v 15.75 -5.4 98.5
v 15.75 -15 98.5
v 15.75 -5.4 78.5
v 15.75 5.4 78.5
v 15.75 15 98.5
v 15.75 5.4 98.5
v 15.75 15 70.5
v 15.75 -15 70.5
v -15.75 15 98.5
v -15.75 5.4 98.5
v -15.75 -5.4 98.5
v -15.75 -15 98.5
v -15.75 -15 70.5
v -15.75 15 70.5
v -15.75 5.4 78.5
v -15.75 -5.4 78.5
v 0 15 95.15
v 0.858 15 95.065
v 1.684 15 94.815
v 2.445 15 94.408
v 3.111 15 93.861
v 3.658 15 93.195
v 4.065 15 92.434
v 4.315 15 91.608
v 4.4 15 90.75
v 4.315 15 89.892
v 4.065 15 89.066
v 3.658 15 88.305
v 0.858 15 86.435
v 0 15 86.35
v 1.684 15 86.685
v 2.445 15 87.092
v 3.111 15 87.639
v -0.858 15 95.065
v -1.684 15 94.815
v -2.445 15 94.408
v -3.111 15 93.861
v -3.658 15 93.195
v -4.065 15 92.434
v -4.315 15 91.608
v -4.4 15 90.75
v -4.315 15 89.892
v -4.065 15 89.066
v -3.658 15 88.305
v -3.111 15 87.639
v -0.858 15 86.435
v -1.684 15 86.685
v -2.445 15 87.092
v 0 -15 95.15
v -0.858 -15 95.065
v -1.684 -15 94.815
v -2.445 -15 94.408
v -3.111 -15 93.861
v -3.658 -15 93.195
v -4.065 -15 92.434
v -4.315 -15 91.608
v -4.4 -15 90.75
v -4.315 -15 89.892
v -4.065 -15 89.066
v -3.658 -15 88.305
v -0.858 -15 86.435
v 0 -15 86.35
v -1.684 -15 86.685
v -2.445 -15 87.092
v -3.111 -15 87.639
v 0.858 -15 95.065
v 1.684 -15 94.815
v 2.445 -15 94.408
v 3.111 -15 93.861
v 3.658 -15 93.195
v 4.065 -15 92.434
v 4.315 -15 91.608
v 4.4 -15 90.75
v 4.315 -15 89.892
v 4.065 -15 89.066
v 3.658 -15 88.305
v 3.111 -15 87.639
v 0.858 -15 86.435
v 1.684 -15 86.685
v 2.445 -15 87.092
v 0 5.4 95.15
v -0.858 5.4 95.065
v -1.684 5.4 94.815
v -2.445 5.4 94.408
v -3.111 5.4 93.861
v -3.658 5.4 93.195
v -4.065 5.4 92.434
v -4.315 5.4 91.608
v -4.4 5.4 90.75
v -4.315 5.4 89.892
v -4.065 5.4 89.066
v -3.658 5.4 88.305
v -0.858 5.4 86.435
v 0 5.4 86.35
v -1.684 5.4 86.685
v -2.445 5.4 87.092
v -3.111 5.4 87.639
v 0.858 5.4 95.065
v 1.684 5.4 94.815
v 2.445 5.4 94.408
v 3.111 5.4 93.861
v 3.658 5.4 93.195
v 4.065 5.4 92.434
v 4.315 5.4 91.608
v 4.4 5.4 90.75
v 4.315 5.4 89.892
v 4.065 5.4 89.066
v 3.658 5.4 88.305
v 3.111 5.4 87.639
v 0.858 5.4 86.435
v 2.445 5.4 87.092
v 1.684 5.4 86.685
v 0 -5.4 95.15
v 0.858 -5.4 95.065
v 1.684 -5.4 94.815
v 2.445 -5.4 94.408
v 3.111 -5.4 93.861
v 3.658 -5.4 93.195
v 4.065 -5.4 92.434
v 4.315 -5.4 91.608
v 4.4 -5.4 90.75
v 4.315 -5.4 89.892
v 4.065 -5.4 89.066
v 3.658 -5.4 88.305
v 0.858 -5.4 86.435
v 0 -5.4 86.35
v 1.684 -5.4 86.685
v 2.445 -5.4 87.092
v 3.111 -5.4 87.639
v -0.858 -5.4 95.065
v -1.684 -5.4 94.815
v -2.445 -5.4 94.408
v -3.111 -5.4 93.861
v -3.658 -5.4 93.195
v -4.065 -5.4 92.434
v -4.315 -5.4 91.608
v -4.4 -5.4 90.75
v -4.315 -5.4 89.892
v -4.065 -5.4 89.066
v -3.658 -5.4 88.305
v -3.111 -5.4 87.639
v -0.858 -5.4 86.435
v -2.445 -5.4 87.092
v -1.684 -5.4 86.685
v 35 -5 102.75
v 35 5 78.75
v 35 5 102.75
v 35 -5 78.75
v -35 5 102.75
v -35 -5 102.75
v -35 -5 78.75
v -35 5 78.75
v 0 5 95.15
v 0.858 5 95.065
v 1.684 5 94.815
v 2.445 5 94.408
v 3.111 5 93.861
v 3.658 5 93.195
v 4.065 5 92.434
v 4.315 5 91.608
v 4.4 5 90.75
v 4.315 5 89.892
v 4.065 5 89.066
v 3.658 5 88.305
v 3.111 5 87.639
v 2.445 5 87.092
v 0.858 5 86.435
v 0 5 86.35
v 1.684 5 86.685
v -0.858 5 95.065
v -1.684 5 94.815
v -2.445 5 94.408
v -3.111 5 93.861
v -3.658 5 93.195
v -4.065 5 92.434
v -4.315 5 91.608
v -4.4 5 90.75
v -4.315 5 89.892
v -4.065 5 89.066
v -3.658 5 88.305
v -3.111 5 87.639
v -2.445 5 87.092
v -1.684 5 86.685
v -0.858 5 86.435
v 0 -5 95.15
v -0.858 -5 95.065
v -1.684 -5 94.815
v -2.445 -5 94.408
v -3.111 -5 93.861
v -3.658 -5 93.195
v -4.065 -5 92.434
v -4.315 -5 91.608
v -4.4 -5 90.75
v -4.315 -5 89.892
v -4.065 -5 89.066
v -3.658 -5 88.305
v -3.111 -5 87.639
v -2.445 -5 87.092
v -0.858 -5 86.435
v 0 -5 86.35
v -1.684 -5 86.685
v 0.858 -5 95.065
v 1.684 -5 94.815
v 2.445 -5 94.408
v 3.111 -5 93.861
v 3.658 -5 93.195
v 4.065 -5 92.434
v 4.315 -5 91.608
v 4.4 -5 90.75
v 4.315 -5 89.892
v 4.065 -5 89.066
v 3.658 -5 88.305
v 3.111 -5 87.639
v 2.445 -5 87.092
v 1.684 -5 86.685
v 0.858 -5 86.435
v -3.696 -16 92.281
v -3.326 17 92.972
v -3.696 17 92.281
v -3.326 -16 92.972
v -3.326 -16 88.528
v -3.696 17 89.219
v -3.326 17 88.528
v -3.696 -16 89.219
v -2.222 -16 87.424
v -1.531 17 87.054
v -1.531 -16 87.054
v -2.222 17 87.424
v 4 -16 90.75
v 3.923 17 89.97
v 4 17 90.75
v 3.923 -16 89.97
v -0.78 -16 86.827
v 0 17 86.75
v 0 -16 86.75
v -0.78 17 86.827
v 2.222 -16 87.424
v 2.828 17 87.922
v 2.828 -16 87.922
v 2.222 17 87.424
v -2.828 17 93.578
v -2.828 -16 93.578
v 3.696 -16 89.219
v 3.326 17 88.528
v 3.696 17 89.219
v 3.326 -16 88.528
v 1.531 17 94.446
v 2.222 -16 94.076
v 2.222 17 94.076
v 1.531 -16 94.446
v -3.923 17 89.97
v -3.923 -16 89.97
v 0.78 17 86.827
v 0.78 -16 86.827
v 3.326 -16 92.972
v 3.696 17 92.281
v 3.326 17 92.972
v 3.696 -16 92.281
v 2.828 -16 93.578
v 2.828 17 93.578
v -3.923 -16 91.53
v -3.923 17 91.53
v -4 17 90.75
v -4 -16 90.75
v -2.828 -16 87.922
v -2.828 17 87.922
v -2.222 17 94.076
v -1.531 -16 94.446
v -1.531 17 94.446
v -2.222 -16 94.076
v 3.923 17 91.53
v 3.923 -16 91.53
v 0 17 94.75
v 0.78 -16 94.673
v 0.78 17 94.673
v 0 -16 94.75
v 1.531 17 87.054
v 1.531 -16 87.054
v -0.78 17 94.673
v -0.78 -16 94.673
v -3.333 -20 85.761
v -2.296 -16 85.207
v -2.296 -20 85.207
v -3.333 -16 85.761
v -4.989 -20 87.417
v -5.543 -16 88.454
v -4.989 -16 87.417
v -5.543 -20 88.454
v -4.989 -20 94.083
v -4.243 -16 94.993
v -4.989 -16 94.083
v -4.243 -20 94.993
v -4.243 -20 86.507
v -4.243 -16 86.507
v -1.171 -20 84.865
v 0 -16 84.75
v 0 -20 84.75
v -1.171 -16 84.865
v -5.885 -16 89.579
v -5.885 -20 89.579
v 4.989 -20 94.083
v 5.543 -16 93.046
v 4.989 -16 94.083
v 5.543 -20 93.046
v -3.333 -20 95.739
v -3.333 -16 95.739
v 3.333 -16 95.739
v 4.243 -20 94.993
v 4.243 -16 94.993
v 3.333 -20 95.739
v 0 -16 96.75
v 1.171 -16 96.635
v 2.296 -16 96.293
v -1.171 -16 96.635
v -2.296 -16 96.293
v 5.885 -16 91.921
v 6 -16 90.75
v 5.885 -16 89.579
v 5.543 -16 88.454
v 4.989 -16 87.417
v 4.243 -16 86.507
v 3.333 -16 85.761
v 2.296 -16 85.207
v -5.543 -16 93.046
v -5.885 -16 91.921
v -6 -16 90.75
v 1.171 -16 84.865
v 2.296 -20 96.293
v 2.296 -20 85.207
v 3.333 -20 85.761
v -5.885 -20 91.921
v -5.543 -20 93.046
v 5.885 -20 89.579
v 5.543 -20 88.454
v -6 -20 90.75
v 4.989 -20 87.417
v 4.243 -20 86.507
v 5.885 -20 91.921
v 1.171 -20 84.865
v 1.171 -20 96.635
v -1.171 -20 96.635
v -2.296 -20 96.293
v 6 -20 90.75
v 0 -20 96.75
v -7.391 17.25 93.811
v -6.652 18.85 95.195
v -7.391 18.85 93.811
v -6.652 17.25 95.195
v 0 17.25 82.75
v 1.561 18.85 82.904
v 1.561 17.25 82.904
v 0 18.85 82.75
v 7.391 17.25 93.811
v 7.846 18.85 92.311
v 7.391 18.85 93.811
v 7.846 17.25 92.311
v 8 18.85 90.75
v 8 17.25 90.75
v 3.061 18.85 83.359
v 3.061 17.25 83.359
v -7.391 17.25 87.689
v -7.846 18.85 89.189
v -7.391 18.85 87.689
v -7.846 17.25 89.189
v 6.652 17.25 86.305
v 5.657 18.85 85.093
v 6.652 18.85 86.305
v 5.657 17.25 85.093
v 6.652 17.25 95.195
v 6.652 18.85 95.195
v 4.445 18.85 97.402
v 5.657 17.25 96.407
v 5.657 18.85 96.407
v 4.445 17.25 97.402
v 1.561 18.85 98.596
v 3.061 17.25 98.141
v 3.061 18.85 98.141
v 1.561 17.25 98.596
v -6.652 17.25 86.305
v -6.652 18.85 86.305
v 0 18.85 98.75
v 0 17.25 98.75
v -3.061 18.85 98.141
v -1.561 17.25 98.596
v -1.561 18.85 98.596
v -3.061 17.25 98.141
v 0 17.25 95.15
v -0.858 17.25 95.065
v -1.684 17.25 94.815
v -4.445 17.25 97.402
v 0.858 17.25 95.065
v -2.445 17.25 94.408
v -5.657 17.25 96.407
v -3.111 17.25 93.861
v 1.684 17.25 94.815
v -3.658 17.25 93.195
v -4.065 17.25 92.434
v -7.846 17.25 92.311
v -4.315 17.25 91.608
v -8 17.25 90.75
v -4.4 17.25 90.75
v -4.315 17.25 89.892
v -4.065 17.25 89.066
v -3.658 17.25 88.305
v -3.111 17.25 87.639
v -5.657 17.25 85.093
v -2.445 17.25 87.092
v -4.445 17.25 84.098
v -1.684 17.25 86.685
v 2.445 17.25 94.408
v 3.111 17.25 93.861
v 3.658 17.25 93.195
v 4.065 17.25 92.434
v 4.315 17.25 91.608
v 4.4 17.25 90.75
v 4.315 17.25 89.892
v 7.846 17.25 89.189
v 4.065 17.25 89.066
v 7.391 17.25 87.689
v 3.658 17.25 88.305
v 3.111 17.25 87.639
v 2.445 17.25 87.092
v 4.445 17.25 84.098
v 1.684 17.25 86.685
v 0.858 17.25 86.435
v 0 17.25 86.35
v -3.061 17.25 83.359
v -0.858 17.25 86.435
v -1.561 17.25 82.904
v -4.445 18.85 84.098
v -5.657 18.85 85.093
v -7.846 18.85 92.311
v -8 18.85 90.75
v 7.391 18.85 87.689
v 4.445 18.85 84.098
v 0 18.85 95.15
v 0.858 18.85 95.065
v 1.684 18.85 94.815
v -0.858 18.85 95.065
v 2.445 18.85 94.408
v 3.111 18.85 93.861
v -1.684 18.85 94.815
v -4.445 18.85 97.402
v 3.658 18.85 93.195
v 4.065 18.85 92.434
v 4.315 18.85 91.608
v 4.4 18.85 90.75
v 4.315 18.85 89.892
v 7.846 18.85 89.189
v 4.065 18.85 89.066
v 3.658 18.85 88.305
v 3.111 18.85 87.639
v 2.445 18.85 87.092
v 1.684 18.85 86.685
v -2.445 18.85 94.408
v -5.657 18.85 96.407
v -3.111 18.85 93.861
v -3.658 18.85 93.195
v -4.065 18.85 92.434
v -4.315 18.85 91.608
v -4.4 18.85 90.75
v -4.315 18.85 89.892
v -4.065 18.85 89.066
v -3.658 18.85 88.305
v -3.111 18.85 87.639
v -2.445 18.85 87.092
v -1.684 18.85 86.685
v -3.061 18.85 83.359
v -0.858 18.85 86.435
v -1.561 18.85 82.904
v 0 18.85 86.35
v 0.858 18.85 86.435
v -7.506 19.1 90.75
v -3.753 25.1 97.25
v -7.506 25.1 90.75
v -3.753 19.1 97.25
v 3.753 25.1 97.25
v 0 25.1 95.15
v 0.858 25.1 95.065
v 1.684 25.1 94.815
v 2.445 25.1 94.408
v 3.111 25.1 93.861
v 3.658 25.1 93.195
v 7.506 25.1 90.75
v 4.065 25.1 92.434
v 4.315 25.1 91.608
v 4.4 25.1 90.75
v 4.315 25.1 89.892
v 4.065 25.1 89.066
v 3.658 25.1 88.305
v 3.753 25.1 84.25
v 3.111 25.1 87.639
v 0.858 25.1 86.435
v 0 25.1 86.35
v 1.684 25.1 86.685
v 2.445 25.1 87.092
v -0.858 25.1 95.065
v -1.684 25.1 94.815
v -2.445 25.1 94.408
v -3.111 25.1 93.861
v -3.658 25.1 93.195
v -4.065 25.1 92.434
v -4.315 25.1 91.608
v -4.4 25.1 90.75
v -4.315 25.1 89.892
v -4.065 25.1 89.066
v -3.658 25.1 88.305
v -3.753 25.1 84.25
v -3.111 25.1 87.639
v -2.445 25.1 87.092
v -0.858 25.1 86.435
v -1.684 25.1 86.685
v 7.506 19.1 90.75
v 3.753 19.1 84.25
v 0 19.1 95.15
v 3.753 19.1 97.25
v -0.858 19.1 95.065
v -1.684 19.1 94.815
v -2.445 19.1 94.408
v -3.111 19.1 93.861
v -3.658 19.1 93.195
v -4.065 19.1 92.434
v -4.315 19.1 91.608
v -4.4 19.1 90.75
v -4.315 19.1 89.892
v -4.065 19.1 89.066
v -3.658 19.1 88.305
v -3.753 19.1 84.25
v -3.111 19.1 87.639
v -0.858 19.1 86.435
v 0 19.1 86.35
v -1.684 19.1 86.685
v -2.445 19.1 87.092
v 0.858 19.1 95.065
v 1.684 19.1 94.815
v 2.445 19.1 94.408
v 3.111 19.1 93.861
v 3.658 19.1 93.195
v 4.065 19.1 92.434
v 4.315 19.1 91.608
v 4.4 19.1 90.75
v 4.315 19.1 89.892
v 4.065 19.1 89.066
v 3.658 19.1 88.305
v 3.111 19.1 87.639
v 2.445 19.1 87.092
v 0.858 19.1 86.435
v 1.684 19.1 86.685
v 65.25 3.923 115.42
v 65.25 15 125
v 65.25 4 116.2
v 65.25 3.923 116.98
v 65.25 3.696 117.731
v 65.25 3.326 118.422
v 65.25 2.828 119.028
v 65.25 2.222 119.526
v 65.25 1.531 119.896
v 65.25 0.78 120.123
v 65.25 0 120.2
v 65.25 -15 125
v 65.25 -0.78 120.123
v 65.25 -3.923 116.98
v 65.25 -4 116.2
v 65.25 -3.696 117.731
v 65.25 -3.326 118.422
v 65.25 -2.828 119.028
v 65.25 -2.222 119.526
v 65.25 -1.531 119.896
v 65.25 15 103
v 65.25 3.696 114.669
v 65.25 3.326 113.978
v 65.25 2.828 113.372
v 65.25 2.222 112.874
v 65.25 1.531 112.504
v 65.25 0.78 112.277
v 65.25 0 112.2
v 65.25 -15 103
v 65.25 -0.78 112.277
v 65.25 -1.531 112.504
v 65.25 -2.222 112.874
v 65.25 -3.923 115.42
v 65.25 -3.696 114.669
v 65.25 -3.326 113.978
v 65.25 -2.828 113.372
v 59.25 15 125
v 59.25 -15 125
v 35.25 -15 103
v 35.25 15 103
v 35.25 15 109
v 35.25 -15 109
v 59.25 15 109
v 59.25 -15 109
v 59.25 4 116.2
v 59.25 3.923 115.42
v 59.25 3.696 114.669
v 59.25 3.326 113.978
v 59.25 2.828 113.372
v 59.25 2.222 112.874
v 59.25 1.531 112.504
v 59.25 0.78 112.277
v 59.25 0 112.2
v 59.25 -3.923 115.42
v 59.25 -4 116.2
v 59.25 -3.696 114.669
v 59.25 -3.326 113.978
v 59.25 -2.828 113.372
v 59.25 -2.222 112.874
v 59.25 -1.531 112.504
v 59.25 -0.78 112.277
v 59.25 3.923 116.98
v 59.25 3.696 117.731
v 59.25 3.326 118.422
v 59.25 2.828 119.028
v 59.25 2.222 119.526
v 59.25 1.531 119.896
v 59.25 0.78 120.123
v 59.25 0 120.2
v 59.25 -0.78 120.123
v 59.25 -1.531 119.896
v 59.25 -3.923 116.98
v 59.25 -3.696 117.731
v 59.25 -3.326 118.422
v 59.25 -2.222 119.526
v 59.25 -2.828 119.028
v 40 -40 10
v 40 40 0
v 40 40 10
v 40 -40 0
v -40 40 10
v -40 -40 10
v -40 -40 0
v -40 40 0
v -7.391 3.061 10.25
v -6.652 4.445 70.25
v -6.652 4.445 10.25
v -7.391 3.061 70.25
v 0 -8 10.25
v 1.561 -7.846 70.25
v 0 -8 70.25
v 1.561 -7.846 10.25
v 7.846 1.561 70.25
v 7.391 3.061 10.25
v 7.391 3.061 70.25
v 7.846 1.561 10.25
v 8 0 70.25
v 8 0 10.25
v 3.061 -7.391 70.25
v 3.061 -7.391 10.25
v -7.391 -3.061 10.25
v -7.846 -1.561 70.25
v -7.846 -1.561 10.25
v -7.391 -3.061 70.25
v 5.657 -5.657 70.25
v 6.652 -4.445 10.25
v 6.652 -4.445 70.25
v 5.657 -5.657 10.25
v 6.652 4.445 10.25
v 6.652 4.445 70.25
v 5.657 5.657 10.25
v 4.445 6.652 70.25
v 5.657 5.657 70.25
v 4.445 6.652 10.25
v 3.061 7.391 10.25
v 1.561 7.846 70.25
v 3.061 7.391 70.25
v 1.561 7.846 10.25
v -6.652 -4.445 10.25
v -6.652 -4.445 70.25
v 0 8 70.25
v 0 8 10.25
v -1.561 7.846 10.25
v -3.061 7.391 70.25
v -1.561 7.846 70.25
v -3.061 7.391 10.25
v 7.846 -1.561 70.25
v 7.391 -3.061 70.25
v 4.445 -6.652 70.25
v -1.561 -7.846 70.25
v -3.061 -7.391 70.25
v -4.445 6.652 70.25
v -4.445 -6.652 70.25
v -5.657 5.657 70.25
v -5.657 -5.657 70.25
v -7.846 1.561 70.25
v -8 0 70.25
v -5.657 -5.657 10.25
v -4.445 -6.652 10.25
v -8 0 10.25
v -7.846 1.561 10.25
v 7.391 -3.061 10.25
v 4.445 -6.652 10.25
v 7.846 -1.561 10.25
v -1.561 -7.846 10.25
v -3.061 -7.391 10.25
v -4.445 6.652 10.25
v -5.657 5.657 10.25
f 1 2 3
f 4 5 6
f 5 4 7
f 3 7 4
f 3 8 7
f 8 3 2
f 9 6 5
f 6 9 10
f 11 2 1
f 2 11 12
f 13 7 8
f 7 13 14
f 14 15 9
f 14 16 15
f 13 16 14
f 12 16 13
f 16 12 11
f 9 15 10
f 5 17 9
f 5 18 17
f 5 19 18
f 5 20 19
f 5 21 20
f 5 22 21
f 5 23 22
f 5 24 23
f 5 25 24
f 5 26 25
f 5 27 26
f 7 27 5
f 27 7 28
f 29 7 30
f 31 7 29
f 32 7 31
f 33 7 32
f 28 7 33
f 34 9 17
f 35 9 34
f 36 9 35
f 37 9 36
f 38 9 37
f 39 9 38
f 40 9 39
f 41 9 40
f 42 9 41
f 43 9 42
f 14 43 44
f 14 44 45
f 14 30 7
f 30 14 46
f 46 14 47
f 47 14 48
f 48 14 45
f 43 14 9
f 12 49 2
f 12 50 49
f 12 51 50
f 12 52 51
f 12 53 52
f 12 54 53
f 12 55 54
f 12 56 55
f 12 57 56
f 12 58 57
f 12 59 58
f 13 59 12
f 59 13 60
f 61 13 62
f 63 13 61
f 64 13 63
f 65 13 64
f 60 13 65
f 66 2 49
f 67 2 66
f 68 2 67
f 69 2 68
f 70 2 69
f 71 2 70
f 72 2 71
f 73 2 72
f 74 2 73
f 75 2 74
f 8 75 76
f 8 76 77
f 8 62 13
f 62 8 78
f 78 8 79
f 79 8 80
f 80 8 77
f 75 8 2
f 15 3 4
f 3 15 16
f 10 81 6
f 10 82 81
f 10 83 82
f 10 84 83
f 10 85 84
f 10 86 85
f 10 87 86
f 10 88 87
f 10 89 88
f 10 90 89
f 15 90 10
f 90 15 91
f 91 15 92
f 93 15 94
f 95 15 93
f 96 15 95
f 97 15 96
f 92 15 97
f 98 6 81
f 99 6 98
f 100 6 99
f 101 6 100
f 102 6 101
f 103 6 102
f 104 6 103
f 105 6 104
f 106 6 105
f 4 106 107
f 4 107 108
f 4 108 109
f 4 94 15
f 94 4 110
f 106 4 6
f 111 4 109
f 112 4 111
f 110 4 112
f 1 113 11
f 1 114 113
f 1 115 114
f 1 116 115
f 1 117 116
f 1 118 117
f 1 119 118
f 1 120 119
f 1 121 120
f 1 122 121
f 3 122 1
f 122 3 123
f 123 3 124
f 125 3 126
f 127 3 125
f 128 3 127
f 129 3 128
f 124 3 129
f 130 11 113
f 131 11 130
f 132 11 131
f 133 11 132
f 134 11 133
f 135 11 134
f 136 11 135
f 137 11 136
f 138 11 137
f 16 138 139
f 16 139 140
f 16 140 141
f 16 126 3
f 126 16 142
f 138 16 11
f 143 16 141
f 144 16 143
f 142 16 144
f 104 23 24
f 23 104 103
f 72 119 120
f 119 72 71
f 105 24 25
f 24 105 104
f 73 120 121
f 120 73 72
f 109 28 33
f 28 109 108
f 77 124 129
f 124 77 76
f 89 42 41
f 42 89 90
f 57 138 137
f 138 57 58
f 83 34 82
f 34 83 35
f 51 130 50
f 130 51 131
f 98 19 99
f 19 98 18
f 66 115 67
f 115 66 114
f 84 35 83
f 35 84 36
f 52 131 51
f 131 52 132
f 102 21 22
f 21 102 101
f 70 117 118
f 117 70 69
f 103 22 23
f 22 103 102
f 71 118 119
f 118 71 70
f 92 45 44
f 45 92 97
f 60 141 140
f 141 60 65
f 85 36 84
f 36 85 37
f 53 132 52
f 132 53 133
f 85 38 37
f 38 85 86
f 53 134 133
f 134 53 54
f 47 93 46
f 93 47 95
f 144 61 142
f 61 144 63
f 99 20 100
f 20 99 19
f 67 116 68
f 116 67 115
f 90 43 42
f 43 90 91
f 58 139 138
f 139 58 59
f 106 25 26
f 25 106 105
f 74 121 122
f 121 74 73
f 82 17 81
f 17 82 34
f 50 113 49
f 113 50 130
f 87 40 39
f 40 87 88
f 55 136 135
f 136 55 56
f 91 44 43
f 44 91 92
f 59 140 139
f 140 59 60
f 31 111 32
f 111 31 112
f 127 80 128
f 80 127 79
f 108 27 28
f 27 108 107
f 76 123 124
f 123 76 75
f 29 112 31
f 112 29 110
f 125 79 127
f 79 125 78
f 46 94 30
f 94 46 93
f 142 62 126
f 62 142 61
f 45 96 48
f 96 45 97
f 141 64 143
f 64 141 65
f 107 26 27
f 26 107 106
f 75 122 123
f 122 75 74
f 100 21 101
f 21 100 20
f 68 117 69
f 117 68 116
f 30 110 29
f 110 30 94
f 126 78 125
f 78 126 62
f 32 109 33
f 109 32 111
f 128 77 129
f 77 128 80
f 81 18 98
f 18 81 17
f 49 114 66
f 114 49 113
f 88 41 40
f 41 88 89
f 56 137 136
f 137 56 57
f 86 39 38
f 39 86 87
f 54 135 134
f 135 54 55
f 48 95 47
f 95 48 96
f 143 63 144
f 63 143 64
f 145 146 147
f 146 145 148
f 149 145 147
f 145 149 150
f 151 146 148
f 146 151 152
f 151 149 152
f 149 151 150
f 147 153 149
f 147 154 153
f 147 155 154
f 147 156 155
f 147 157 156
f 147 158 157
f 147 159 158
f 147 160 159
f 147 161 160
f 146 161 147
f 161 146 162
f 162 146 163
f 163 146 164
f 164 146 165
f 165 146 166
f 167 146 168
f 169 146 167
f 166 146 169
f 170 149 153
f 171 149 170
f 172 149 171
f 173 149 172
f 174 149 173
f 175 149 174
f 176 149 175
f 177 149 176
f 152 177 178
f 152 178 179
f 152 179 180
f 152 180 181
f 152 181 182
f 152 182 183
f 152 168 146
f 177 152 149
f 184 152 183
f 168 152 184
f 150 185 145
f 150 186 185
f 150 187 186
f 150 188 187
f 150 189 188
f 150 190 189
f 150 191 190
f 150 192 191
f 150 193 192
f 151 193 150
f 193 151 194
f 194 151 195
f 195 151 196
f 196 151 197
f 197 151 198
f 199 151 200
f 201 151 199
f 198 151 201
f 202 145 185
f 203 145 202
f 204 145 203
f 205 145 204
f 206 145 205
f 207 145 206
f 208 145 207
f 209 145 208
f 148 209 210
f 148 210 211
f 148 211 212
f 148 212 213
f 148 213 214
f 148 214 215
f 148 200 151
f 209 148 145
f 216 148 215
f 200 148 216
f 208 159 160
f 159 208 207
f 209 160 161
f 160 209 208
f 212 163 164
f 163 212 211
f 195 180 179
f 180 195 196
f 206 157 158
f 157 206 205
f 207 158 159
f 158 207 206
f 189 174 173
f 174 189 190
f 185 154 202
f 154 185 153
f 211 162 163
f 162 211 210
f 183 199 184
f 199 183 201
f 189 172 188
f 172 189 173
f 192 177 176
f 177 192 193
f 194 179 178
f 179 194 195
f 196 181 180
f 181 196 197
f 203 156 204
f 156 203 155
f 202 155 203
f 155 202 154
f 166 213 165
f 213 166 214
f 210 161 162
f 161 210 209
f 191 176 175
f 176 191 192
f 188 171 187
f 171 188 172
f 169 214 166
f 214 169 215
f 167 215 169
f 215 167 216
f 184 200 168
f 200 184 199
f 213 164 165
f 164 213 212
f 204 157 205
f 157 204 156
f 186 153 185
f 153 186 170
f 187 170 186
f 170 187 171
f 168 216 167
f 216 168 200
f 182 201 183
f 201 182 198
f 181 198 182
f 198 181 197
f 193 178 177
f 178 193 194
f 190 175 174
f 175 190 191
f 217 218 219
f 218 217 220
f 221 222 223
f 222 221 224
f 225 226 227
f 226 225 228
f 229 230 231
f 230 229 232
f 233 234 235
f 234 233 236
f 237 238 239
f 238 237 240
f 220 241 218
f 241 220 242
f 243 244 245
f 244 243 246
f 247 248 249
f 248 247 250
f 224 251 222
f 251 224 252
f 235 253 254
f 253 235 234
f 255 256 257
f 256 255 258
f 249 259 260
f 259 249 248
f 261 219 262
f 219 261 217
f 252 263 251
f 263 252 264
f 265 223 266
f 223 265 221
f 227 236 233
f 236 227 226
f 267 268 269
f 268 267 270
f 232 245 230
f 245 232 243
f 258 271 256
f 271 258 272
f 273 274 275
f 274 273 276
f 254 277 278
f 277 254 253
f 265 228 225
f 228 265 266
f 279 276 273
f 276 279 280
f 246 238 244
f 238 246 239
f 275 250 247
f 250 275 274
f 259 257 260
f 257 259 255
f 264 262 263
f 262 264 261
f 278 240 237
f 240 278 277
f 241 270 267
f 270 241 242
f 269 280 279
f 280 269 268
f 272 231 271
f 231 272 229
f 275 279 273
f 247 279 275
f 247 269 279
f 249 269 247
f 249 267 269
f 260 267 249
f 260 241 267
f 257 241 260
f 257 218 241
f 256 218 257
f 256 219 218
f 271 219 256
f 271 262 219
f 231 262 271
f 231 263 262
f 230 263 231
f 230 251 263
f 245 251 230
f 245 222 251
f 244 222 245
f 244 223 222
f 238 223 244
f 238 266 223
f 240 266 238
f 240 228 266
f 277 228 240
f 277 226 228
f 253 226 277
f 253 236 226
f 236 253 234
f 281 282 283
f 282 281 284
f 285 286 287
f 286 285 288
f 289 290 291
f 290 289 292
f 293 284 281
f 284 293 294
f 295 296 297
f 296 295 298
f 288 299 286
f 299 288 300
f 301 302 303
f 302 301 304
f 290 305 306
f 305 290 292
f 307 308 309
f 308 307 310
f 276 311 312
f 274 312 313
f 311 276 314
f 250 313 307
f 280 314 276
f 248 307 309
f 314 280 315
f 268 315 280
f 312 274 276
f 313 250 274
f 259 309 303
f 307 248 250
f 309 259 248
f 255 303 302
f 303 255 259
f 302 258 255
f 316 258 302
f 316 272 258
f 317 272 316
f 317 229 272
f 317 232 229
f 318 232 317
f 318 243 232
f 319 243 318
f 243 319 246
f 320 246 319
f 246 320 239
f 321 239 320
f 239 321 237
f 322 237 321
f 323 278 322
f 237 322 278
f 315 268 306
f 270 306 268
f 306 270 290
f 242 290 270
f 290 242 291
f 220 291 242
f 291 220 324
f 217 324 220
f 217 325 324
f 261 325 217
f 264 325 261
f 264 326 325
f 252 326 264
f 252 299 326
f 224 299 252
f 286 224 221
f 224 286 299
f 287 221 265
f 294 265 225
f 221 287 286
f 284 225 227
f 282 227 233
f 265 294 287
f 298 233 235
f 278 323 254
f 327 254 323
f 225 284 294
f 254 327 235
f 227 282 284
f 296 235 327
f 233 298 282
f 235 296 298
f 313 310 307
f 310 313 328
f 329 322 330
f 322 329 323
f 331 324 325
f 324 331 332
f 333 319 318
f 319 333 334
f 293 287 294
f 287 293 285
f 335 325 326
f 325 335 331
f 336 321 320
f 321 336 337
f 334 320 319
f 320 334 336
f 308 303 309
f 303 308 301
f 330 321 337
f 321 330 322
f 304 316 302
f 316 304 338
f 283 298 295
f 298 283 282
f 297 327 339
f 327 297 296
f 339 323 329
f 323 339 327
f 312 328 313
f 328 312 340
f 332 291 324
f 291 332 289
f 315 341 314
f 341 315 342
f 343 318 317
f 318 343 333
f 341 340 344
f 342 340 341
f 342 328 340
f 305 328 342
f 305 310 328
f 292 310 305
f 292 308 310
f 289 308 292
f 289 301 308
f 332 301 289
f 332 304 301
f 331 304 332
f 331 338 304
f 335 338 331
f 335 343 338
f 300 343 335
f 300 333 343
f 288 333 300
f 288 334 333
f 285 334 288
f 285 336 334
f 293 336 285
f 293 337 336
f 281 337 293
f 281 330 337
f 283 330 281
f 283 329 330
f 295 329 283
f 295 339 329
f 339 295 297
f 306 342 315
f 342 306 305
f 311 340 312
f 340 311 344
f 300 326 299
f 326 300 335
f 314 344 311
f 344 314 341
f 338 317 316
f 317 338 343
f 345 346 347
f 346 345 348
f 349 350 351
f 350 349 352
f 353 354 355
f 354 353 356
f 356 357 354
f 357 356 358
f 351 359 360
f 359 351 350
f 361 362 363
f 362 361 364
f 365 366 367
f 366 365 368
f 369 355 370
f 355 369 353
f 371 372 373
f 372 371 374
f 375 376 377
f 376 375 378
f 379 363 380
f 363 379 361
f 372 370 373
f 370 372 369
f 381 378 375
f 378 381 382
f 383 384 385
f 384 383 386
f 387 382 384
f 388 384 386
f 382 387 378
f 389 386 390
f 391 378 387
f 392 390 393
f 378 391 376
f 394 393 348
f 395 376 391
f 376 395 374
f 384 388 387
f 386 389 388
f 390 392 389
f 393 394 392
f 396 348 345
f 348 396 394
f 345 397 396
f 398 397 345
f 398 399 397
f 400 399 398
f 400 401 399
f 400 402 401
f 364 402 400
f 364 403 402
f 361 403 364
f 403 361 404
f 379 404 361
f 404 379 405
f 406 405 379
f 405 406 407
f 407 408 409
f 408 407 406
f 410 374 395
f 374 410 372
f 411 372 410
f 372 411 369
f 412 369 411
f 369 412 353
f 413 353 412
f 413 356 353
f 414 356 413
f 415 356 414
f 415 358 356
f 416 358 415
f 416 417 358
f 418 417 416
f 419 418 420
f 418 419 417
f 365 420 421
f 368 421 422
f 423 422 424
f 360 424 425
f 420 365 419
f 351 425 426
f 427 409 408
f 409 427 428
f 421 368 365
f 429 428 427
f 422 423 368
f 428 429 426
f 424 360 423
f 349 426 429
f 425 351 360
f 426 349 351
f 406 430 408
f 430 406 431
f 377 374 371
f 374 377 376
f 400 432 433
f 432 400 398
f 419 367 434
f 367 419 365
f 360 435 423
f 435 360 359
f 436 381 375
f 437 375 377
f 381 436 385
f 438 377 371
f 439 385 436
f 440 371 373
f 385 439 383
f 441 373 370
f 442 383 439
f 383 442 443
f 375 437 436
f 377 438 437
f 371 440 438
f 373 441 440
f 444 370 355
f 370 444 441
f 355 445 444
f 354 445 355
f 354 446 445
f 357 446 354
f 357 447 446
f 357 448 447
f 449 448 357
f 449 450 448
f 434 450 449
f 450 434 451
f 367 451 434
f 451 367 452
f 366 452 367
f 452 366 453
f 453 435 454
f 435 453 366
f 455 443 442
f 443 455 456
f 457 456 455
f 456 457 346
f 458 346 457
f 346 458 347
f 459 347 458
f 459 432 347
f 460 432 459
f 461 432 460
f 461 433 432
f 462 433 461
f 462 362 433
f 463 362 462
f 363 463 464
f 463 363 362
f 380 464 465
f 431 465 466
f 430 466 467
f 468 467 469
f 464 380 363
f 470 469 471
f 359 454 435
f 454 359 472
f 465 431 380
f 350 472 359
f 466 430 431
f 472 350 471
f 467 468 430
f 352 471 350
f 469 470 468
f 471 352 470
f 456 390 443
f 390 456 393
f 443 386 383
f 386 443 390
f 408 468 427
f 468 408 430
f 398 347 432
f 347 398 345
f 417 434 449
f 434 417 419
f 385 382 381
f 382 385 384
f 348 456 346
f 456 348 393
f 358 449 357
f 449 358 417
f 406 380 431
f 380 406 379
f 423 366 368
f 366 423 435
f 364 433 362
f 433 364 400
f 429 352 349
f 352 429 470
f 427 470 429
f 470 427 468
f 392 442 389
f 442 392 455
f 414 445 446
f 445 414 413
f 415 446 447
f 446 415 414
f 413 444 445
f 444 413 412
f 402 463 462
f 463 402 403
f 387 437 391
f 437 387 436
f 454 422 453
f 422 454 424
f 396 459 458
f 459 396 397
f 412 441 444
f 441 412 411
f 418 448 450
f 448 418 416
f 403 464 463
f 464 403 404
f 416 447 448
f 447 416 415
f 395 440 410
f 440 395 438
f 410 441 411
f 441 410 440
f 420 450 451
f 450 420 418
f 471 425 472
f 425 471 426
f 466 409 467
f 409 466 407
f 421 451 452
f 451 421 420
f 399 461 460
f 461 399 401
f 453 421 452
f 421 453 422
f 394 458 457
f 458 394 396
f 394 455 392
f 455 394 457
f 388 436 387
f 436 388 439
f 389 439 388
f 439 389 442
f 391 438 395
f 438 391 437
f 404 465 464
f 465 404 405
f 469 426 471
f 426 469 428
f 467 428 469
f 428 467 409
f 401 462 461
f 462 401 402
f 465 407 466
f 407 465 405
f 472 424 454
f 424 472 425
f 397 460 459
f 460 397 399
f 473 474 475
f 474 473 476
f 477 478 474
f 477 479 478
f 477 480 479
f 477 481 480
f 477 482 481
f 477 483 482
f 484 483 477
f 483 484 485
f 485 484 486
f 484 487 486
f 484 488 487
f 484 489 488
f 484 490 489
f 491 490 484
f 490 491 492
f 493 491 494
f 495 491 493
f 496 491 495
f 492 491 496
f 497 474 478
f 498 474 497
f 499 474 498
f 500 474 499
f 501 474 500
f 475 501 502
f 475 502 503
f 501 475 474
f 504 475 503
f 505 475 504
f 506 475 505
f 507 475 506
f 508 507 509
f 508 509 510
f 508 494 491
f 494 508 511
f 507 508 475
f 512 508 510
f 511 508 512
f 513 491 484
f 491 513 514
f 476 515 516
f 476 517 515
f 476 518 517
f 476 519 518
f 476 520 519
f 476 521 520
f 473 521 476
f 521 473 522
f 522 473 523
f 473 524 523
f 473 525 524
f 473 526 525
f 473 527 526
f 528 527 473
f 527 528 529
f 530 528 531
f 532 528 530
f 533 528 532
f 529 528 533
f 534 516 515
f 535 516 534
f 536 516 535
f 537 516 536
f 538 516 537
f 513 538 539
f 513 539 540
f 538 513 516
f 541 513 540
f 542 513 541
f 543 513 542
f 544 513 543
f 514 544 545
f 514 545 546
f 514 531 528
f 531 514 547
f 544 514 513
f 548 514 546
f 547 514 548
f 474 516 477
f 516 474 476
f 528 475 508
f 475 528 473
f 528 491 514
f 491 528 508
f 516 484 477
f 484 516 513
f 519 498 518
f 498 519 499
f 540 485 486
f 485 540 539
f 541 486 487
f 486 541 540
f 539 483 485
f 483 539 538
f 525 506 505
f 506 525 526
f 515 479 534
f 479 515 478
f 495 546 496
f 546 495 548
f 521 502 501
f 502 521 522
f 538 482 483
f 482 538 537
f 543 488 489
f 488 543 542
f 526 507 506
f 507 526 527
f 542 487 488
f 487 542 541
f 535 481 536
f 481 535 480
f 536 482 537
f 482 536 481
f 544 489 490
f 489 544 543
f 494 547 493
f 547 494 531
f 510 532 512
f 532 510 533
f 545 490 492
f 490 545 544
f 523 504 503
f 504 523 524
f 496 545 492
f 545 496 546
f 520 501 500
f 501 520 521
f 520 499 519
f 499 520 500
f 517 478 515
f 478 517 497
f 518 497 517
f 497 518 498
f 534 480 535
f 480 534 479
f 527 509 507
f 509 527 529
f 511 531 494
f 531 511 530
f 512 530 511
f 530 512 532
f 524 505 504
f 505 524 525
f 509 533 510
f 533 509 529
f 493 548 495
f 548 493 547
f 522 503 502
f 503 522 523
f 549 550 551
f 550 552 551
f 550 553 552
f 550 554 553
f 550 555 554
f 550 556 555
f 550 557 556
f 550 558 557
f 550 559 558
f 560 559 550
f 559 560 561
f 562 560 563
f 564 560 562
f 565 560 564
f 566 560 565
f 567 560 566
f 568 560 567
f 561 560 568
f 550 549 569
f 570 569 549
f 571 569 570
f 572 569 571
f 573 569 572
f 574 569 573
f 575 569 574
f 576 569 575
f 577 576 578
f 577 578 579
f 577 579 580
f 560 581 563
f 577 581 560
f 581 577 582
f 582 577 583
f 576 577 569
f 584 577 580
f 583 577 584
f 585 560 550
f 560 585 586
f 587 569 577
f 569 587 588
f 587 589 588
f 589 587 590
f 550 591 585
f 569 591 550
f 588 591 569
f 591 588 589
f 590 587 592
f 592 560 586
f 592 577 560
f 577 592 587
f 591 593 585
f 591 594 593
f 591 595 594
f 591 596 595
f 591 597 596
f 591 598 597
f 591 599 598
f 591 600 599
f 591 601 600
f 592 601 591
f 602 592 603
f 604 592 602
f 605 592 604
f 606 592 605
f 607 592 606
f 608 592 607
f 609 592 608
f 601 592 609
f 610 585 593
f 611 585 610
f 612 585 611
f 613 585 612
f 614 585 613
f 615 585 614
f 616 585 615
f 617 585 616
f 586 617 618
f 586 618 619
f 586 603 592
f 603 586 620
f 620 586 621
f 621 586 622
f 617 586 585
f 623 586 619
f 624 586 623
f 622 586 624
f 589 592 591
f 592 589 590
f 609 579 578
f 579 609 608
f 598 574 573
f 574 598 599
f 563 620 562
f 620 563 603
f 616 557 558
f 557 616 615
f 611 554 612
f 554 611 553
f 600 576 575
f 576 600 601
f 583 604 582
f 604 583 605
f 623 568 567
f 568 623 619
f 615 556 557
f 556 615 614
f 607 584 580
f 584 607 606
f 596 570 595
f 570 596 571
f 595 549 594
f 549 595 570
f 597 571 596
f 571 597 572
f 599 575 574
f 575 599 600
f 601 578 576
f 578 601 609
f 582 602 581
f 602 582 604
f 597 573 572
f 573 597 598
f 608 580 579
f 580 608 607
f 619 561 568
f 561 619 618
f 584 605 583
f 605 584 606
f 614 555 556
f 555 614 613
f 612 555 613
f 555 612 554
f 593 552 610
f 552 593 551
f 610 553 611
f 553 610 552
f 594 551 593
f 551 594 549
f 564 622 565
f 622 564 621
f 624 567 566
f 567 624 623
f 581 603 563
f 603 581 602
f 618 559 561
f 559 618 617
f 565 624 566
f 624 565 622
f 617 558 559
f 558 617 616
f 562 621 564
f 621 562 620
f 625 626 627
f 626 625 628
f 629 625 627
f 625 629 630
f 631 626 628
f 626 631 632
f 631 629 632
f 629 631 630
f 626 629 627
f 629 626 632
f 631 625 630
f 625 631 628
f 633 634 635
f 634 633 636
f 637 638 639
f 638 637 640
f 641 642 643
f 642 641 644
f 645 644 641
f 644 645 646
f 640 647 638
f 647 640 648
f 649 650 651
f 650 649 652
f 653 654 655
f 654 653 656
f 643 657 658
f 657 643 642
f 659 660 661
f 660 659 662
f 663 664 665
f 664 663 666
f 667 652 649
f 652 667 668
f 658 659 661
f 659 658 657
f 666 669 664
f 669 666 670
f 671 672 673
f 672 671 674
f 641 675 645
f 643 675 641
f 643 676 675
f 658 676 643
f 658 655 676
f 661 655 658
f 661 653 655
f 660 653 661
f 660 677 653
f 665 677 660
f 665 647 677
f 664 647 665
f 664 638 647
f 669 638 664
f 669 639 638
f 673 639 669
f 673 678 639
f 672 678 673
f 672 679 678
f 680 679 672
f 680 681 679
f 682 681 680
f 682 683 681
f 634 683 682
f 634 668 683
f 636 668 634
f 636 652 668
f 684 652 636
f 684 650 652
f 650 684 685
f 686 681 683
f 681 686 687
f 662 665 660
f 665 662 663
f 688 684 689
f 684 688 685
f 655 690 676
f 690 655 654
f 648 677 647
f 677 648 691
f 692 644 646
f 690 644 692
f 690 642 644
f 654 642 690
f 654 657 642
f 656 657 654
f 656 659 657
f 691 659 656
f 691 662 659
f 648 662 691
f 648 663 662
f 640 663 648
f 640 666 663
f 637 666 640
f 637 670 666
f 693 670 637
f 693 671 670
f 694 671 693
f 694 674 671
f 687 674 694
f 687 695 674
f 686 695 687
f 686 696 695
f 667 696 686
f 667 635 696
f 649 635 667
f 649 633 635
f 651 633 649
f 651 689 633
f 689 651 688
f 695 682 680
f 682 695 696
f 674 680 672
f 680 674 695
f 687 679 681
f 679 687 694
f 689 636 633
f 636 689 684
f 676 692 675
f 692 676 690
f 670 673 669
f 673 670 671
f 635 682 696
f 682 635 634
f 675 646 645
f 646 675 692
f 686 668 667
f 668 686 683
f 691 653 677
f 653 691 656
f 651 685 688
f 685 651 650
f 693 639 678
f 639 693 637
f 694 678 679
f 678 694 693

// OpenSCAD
$fn = 32;

// ------------------------------------------------------------------------
// Lamp arm: column d16 x 60 mm, arm 70 mm
// Every part is its own module, assembly() places every instance.
// ------------------------------------------------------------------------

// --- part 1 ---
module lamp_base() {
  difference() {
    translate([-40, -40, 0]) cube([80, 80, 10]);
  }
}

// --- part 2 ---
module lamp_column() {
  cylinder(h = 60, d = 16);
}

// --- part 3 ---
module head_fork() {
  difference() {
    translate([-15.75, -15, 0]) cube([31.5, 30, 28]);
    translate([-16.75, -5.4, 8]) cube([33.5, 10.8, 21]);
    translate([0, 0, 20.25]) rotate([90, 0, 0]) cylinder(h = 32, d = 8.8, center = true);
  }
}

// --- part 4 ---
module lamp_arm() {
  difference() {
    translate([-35, -5, 0]) cube([70, 10, 24]);
    translate([0, 0, 12]) rotate([90, 0, 0]) cylinder(h = 12, d = 8.8, center = true);
  }
}

// --- part 5 ---
module arm_pin() {
  rotate([0, 90, 0]) cylinder(h = 34, d = 8, center = true);
  translate([-20, 0, 0]) rotate([0, 90, 0]) cylinder(h = 4, d = 12);
}

// --- part 6 ---
module arm_washer() {
  difference() {
      translate([0, 0, 0]) cylinder(h = 1.6, d = 16);
      translate([0, 0, -1]) cylinder(h = 3.6, d = 8.8);
    }
}

// --- part 7 ---
module arm_nut() {
  difference() {
    linear_extrude(height = 6) polygon(points = [[7.506, 0], [3.753, 6.5], [-3.753, 6.5], [-7.506, 0], [-3.753, -6.5], [3.753, -6.5]]);
    translate([0, 0, -1]) cylinder(h = 8, d = 8.8);
  }
}

// --- part 8 ---
module shade_bracket() {
  difference() {
    translate([-15, -15, 0]) cube([30, 30, 22]);
    translate([-16, -16, 6]) cube([25, 32, 17]);
    translate([12, 0, 13.2]) rotate([0, 90, 0]) cylinder(h = 8, d = 8, center = true);
  }
}

// --- assembly ---
module assembly() {
  color([0.80, 0.24, 0.20]) translate([0, 0, 0]) rotate([0, 0, 0]) lamp_base();
  color([0.20, 0.45, 0.75]) translate([0, 0, 10.25]) rotate([0, 0, 0]) lamp_column();
  color([0.25, 0.62, 0.32]) translate([0, 0, 70.5]) rotate([0, 0, 0]) head_fork();
  color([0.92, 0.70, 0.18]) translate([0, 0, 78.75]) rotate([0, 0, 0]) lamp_arm();
  color([0.58, 0.35, 0.70]) translate([0, 0, 90.75]) rotate([0, 0, 90]) arm_pin();
  color([0.16, 0.66, 0.66]) translate([0, 18.85, 90.75]) rotate([90, 0, 0]) arm_washer();
  color([0.85, 0.48, 0.18]) translate([0, 25.1, 90.75]) rotate([90, 0, 0]) arm_nut();
  color([0.55, 0.60, 0.65]) translate([50.25, 0, 103]) rotate([0, 0, 0]) shade_bracket();
}

assembly();
